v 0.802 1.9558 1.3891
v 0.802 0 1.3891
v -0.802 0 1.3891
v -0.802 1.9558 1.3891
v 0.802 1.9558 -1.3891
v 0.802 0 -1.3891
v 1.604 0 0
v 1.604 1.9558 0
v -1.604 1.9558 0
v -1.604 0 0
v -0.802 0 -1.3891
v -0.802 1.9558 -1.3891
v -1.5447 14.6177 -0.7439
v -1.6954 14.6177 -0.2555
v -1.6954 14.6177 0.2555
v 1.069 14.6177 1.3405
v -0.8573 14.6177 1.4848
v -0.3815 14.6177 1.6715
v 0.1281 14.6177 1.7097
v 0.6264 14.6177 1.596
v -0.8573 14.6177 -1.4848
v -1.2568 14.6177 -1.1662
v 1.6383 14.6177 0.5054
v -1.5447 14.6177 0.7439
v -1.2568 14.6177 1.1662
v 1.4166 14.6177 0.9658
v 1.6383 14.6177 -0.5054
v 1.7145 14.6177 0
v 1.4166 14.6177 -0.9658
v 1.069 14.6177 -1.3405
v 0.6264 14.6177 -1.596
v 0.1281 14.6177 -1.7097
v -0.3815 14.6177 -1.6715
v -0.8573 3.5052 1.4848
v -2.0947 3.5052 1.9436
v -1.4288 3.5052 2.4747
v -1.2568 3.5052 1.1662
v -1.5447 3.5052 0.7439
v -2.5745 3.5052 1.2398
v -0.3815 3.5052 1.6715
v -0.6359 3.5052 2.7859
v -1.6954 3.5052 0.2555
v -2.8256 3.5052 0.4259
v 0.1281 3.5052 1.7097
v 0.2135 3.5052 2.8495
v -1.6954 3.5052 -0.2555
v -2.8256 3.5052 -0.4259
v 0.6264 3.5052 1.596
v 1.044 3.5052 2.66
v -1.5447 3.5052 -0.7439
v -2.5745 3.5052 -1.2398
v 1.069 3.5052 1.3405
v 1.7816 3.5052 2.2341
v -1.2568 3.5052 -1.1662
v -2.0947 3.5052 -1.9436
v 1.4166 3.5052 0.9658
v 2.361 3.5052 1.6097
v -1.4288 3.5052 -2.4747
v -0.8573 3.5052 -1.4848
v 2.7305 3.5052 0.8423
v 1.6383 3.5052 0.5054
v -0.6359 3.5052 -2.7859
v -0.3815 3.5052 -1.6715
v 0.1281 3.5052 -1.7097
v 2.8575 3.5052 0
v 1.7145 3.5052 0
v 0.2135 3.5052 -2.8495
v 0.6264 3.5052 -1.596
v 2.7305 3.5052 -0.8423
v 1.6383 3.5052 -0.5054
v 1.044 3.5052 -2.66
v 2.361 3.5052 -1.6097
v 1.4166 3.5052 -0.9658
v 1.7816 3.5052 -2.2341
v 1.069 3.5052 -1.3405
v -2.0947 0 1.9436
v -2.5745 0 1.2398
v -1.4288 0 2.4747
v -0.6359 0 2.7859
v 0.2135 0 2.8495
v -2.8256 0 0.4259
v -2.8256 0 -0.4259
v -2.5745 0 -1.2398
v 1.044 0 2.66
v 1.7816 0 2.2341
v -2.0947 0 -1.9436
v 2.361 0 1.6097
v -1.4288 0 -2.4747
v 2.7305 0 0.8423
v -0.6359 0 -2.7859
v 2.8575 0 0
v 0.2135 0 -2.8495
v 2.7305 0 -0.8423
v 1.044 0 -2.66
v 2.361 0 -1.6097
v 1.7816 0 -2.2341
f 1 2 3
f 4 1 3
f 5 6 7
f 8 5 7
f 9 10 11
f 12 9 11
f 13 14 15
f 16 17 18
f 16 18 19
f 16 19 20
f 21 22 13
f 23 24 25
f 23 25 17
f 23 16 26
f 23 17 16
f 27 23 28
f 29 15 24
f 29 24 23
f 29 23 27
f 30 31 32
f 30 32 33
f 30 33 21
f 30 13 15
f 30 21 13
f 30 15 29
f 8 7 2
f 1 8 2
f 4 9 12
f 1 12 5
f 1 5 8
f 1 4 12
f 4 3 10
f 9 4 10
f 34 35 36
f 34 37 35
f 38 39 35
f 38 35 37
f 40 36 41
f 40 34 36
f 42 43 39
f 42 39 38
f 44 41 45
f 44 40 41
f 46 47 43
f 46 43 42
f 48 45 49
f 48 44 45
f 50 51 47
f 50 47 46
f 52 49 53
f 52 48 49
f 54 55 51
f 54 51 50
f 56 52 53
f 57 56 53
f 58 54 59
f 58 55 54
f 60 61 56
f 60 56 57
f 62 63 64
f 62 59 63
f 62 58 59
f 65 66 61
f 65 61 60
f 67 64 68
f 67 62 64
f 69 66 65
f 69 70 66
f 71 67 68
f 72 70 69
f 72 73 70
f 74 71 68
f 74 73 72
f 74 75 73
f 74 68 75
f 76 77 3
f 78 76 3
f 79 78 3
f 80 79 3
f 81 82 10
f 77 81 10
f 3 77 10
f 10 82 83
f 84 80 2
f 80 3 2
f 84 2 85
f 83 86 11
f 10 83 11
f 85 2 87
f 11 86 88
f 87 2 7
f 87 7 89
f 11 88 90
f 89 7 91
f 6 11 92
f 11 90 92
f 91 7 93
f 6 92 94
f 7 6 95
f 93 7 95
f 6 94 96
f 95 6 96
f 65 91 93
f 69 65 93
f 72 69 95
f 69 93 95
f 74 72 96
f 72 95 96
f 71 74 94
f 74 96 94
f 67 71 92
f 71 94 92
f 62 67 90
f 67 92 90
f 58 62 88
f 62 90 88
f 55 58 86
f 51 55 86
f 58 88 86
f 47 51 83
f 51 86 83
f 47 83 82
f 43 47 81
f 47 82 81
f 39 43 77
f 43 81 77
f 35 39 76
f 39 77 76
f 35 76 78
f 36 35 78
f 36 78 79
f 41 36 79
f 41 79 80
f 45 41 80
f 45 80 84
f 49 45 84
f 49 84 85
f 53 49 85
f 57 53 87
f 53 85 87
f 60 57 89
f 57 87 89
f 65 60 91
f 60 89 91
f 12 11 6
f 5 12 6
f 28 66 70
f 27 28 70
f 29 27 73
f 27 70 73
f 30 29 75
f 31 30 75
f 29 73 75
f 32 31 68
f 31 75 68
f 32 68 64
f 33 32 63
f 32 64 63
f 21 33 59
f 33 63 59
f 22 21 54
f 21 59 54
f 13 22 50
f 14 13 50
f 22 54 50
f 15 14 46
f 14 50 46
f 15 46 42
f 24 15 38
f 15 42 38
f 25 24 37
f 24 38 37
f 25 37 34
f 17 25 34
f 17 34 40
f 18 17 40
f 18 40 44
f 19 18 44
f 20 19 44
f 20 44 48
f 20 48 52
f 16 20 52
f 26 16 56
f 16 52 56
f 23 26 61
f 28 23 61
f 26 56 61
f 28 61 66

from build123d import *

# Parameters (mm, degrees)
SKETCH1_R           = 2.8575
BOSS_EXTRUDE1_DEPTH = 3.5052
CUT_EXTRUDE1_DEPTH  = 1.9558
SKETCH3_R           = 1.7145
BOSS_EXTRUDE2_DEPTH = 11.1125


with BuildPart() as part:
    # Sketch1 → Boss-Extrude1 (new body)
    with BuildSketch(Plane(origin=(0, 0, 0), x_dir=(1, 0, 0), z_dir=(0, 1, 0))):
        Circle(SKETCH1_R)
    extrude(amount=BOSS_EXTRUDE1_DEPTH)

    # Sketch2 → Cut-Extrude1 (cut)
    with BuildSketch(Plane.XZ):
        Polygon((1.603951217, 0), (0.801975608, 1.3890625), (-0.801975608, 1.3890625), (-1.603951217, 0), (-0.801975608, -1.3890625), (0.801975608, -1.3890625), align=None)
    extrude(amount=-CUT_EXTRUDE1_DEPTH, mode=Mode.SUBTRACT)

    # Sketch3 → Boss-Extrude2 (add)
    with BuildSketch(Plane(origin=(0, 3.5052, 0), x_dir=(1, 0, 0), z_dir=(0, 1, 0))):
        Circle(SKETCH3_R)
    extrude(amount=BOSS_EXTRUDE2_DEPTH)


solid = part.part
